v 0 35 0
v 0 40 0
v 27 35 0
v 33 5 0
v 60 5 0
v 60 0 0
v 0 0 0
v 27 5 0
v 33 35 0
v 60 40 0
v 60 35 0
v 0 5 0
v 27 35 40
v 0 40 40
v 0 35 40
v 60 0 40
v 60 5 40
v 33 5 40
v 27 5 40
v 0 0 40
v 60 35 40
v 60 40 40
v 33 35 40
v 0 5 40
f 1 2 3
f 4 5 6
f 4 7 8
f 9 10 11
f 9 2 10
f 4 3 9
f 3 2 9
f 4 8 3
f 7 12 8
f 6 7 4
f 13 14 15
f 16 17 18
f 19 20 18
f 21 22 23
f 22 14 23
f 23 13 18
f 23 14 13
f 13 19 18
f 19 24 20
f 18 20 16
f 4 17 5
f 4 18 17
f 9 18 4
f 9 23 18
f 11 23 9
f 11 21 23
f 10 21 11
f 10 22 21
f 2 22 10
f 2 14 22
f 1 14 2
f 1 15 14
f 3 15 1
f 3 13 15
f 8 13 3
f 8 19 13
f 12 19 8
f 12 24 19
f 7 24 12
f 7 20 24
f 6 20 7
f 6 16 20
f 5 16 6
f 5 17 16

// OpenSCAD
$fn = 32;

// ----------------------------------------------------------------------
// Structural section: ibeam 60 x 40 mm
// ----------------------------------------------------------------------

// --- parameters (mm) ---
sec_w = 60;               // section width, X
sec_h = 40;               // section height, Y
flange_t = 5;             // flange thickness
web_t = 6;                // web thickness
plate_t = 40;             // cut length, Z (extrusion height)

profile = [[0, 0], [60, 0], [60, 5], [33, 5], [33, 35], [60, 35], [60, 40], [0, 40], [0, 35], [27, 35], [27, 5], [0, 5]];  // primary outline, 12 points, counter clockwise

// --- the one profile operation ---
linear_extrude(height = plate_t) polygon(points = profile);
